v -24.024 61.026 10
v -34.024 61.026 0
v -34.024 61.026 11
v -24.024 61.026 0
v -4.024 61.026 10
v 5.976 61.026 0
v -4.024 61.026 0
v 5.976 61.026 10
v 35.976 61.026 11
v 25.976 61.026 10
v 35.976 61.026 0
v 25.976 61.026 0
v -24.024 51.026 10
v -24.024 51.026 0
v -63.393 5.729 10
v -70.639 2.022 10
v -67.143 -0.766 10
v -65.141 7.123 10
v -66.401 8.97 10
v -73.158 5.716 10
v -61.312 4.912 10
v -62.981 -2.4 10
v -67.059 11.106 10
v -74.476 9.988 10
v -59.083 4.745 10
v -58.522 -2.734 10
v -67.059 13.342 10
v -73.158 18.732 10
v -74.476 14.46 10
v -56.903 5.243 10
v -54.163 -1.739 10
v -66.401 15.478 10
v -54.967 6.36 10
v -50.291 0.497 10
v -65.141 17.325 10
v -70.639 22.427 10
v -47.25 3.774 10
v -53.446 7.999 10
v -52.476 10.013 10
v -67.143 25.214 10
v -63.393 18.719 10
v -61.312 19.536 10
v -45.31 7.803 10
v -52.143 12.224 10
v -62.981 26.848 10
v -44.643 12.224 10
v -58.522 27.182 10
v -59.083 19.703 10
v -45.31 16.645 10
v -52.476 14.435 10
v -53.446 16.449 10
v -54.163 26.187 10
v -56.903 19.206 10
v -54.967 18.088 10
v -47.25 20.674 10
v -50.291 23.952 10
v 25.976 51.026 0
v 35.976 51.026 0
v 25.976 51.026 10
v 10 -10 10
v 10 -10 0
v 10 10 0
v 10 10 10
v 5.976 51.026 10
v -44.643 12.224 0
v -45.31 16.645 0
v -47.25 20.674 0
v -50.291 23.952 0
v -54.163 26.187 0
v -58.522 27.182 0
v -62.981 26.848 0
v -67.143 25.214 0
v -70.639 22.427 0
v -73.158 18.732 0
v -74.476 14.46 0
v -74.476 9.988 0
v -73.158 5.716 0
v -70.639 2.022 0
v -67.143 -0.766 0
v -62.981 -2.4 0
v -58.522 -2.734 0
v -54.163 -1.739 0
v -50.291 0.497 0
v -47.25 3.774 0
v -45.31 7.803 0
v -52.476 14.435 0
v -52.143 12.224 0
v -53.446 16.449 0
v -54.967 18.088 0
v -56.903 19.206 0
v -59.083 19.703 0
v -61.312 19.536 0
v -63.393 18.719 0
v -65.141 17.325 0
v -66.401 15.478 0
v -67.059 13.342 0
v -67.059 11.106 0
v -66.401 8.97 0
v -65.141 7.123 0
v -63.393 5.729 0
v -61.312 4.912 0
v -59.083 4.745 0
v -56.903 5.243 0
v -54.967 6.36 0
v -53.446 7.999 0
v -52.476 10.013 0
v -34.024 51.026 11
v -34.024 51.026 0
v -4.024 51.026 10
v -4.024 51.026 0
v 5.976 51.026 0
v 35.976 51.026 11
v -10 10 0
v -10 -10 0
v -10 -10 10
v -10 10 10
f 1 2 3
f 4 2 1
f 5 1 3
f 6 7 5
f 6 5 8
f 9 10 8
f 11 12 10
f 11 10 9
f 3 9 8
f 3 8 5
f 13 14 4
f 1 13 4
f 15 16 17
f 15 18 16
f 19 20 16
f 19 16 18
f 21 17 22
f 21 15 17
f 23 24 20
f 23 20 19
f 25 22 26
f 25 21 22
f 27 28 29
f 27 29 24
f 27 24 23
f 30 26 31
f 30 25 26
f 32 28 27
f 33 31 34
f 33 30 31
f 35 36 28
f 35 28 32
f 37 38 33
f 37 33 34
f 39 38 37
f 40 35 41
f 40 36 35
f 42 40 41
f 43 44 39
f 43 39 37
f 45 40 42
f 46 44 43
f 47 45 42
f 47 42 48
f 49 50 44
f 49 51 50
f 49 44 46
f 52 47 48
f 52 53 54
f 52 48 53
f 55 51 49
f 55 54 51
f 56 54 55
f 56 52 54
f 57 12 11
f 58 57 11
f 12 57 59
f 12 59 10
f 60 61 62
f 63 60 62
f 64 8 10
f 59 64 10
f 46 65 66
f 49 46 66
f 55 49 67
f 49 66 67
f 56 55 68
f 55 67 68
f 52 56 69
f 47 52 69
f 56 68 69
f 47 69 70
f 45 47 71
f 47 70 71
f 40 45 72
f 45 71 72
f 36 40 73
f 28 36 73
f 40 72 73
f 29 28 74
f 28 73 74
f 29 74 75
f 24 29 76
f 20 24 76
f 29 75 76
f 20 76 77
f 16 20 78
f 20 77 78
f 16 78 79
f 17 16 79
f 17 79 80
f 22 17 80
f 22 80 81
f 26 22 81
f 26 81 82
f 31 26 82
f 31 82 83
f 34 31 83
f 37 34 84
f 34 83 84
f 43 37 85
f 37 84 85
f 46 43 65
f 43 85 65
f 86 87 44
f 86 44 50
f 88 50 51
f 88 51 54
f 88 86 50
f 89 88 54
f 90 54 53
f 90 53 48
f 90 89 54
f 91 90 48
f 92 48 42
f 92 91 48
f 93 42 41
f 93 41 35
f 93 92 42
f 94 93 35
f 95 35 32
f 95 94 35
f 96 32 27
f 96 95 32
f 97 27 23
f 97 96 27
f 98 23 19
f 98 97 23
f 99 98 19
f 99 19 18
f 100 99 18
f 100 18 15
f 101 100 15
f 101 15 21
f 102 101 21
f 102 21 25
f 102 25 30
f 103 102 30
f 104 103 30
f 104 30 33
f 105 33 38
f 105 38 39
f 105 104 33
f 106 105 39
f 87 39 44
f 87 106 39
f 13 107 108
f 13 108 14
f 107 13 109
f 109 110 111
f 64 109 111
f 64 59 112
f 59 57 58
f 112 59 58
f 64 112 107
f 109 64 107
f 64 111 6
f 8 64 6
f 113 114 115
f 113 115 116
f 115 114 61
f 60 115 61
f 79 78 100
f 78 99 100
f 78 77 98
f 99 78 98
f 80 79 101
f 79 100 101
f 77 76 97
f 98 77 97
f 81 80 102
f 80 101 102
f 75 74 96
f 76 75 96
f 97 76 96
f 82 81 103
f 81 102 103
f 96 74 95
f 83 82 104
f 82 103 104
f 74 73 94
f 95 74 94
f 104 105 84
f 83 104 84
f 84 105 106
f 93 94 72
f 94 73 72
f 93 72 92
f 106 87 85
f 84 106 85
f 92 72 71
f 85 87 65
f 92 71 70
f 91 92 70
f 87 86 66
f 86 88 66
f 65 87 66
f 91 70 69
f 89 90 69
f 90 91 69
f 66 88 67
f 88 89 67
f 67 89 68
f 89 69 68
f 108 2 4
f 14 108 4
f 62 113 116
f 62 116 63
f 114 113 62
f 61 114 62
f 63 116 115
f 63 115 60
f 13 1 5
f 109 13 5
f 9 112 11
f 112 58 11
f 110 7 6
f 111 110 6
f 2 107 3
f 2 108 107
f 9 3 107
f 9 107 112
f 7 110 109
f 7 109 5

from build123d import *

# Parameters (mm, degrees)
F0_W     = 20
F0_H     = 20
F1_DEPTH = 10
F2_W     = 10
F2_H     = 10
F3_DEPTH = 10
F4_W     = 70
F4_H     = 10
F5_DEPTH = 1
F6_R     = 15
F6_R_2   = 7.5
F7_DEPTH = 10


with BuildPart() as f1:
    # F0 (on Top) → F1 (new body)
    with BuildSketch(Plane.XY):
        Rectangle(F0_W, F0_H)
    extrude(amount=F1_DEPTH)


with BuildPart() as f3:
    # F2 (on Top) → F3 (new body)
    with BuildSketch(Plane.XY):
        with Locations((-29.024249, 56.026291)):
            Rectangle(F2_W, F2_H)
        with Locations((0.975751, 56.026291)):
            Rectangle(F2_W, F2_H)
        with Locations((30.975751, 56.026291)):
            Rectangle(F2_W, F2_H)
    extrude(amount=F3_DEPTH)

    # F4 (on face) → F5 (join)
    with BuildSketch(Plane.XY.offset(10)):
        with Locations((0.975751, 56.026291)):
            Rectangle(F4_W, F4_H)
    extrude(amount=F5_DEPTH)


with BuildPart() as f7:
    # F6 (on Top) → F7 (new body)
    with BuildSketch(Plane.XY):
        with Locations((-59.643239, 12.224113)):
            Circle(F6_R)
        with Locations((-59.643239, 12.224113)):
            Circle(F6_R_2, mode=Mode.SUBTRACT)
    extrude(amount=F7_DEPTH)


solid = Compound([f1.part, f3.part, f7.part])
